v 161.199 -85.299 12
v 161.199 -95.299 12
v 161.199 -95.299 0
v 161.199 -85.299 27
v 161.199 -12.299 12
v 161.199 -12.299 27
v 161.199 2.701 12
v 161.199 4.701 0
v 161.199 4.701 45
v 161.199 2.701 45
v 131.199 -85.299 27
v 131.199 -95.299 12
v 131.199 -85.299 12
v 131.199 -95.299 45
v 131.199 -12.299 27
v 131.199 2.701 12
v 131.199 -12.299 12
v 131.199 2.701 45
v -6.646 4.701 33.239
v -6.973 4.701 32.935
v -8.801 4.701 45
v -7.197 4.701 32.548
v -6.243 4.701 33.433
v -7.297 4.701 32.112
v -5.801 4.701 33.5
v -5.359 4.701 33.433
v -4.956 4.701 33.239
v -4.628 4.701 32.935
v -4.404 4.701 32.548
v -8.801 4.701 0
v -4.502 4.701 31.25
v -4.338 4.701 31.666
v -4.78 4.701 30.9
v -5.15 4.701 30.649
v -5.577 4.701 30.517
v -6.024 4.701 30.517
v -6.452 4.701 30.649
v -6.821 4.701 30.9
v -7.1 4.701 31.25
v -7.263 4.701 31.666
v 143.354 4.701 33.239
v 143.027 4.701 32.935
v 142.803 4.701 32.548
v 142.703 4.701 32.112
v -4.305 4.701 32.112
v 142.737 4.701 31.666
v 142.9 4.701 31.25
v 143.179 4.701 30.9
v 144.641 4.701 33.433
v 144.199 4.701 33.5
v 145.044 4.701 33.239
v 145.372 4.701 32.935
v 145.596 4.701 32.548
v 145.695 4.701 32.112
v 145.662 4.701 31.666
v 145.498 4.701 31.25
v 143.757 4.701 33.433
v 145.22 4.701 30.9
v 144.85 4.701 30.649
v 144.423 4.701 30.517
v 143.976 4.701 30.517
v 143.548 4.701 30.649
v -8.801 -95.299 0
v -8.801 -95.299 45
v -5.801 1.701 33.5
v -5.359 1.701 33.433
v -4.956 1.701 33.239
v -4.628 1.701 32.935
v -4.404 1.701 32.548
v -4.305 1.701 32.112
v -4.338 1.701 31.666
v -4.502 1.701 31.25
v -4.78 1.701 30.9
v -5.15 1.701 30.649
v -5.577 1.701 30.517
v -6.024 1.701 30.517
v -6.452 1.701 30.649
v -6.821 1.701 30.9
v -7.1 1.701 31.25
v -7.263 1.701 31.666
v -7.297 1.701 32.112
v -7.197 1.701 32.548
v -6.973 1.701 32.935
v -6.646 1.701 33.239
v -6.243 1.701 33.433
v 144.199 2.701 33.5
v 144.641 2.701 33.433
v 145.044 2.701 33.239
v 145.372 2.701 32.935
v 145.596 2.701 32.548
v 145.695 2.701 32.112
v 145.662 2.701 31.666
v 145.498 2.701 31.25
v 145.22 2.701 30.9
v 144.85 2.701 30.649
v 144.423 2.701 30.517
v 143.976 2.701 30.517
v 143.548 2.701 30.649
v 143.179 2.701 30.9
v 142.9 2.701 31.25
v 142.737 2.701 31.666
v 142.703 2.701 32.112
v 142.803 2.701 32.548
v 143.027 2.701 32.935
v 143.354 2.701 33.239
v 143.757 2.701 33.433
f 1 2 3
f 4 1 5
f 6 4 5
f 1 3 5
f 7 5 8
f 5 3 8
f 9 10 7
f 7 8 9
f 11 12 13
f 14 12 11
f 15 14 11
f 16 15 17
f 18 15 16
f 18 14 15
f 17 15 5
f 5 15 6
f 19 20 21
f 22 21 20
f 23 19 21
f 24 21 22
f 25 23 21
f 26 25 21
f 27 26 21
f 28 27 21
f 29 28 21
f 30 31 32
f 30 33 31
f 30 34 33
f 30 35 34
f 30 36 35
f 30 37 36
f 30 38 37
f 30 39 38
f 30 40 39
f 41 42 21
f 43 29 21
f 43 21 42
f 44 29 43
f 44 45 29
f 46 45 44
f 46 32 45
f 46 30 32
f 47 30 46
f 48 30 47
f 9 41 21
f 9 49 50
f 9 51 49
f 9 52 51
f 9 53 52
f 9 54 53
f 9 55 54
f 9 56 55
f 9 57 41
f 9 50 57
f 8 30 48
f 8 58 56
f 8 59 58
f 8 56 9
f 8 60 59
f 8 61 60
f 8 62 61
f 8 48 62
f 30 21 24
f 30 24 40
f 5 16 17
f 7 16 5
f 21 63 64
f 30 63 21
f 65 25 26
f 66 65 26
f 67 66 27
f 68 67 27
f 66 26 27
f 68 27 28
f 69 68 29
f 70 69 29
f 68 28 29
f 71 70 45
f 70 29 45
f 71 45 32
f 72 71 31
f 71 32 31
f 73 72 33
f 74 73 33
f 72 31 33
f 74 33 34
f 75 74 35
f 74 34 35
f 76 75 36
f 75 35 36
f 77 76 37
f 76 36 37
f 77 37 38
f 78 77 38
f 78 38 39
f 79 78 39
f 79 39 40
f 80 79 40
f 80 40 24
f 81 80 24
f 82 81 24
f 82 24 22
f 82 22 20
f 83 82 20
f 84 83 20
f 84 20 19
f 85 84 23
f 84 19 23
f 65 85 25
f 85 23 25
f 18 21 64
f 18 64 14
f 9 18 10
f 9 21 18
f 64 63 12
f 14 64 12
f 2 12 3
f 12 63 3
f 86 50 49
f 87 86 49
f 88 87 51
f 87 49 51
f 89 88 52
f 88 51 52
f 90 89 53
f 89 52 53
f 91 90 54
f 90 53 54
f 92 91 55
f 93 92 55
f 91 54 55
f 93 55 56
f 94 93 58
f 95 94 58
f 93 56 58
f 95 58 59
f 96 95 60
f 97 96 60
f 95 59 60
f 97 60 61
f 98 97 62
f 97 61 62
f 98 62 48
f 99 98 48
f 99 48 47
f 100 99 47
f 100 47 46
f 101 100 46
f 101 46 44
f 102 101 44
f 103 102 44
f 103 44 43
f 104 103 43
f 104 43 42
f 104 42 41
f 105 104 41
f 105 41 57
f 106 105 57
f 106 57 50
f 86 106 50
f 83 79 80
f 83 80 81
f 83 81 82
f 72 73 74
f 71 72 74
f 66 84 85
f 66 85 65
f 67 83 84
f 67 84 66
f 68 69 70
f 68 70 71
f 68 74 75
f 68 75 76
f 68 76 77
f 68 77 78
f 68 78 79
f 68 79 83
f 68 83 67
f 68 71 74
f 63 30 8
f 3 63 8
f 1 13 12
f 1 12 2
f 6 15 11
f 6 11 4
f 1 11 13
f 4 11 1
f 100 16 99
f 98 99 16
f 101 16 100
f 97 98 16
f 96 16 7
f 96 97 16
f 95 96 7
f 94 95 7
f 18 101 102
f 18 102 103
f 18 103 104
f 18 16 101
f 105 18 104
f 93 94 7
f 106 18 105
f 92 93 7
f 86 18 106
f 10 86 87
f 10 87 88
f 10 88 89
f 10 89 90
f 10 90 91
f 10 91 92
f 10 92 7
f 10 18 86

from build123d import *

# Parameters (mm, degrees)
SKETCH1_W           = 170
SKETCH1_H           = 100
BOSS_EXTRUDE1_DEPTH = 45
SKETCH3_W           = 30
SKETCH3_H           = 98
CUT_EXTRUDE2_DEPTH  = 18
SKETCH4_W           = 30
SKETCH4_H           = 10
SKETCH4_H_2         = 15
CUT_EXTRUDE3_DEPTH  = 15
SKETCH5_R           = 1.5
CUT_EXTRUDE4_DEPTH  = 3


with BuildPart() as part:
    # Sketch1 → Boss-Extrude1 (new body)
    with BuildSketch(Plane.XY):
        with Locations((76.199255121, -45.298882682)):
            Rectangle(SKETCH1_W, SKETCH1_H)
    extrude(amount=BOSS_EXTRUDE1_DEPTH)

    # Sketch3 → Cut-Extrude2 (cut)
    with BuildSketch(Plane.XY.offset(45)):
        with Locations((146.199255121, -46.298882682)):
            Rectangle(SKETCH3_W, SKETCH3_H)
    extrude(amount=-CUT_EXTRUDE2_DEPTH, mode=Mode.SUBTRACT)

    # Sketch4 → Cut-Extrude3 (cut)
    with BuildSketch(Plane.XY.offset(27)):
        with Locations((146.199255121, -90.298882682)):
            Rectangle(SKETCH4_W, SKETCH4_H)
        with Locations((146.199255121, -4.798882682)):
            Rectangle(SKETCH4_W, SKETCH4_H_2)
    extrude(amount=-CUT_EXTRUDE3_DEPTH, mode=Mode.SUBTRACT)

    # Sketch5 → Cut-Extrude4 (cut)
    with BuildSketch(Plane(origin=(0, 4.701117318, 0), x_dir=(1, 0, 0), z_dir=(0, 1, 0))):
        with Locations(Location((-5.800744879, -32, 0), (0, 0, 270))):
            Circle(SKETCH5_R)
        with Locations(Location((144.199255121, -32, 0), (0, 0, 270))):
            Circle(SKETCH5_R)
    extrude(amount=-CUT_EXTRUDE4_DEPTH, mode=Mode.SUBTRACT)


solid = part.part
